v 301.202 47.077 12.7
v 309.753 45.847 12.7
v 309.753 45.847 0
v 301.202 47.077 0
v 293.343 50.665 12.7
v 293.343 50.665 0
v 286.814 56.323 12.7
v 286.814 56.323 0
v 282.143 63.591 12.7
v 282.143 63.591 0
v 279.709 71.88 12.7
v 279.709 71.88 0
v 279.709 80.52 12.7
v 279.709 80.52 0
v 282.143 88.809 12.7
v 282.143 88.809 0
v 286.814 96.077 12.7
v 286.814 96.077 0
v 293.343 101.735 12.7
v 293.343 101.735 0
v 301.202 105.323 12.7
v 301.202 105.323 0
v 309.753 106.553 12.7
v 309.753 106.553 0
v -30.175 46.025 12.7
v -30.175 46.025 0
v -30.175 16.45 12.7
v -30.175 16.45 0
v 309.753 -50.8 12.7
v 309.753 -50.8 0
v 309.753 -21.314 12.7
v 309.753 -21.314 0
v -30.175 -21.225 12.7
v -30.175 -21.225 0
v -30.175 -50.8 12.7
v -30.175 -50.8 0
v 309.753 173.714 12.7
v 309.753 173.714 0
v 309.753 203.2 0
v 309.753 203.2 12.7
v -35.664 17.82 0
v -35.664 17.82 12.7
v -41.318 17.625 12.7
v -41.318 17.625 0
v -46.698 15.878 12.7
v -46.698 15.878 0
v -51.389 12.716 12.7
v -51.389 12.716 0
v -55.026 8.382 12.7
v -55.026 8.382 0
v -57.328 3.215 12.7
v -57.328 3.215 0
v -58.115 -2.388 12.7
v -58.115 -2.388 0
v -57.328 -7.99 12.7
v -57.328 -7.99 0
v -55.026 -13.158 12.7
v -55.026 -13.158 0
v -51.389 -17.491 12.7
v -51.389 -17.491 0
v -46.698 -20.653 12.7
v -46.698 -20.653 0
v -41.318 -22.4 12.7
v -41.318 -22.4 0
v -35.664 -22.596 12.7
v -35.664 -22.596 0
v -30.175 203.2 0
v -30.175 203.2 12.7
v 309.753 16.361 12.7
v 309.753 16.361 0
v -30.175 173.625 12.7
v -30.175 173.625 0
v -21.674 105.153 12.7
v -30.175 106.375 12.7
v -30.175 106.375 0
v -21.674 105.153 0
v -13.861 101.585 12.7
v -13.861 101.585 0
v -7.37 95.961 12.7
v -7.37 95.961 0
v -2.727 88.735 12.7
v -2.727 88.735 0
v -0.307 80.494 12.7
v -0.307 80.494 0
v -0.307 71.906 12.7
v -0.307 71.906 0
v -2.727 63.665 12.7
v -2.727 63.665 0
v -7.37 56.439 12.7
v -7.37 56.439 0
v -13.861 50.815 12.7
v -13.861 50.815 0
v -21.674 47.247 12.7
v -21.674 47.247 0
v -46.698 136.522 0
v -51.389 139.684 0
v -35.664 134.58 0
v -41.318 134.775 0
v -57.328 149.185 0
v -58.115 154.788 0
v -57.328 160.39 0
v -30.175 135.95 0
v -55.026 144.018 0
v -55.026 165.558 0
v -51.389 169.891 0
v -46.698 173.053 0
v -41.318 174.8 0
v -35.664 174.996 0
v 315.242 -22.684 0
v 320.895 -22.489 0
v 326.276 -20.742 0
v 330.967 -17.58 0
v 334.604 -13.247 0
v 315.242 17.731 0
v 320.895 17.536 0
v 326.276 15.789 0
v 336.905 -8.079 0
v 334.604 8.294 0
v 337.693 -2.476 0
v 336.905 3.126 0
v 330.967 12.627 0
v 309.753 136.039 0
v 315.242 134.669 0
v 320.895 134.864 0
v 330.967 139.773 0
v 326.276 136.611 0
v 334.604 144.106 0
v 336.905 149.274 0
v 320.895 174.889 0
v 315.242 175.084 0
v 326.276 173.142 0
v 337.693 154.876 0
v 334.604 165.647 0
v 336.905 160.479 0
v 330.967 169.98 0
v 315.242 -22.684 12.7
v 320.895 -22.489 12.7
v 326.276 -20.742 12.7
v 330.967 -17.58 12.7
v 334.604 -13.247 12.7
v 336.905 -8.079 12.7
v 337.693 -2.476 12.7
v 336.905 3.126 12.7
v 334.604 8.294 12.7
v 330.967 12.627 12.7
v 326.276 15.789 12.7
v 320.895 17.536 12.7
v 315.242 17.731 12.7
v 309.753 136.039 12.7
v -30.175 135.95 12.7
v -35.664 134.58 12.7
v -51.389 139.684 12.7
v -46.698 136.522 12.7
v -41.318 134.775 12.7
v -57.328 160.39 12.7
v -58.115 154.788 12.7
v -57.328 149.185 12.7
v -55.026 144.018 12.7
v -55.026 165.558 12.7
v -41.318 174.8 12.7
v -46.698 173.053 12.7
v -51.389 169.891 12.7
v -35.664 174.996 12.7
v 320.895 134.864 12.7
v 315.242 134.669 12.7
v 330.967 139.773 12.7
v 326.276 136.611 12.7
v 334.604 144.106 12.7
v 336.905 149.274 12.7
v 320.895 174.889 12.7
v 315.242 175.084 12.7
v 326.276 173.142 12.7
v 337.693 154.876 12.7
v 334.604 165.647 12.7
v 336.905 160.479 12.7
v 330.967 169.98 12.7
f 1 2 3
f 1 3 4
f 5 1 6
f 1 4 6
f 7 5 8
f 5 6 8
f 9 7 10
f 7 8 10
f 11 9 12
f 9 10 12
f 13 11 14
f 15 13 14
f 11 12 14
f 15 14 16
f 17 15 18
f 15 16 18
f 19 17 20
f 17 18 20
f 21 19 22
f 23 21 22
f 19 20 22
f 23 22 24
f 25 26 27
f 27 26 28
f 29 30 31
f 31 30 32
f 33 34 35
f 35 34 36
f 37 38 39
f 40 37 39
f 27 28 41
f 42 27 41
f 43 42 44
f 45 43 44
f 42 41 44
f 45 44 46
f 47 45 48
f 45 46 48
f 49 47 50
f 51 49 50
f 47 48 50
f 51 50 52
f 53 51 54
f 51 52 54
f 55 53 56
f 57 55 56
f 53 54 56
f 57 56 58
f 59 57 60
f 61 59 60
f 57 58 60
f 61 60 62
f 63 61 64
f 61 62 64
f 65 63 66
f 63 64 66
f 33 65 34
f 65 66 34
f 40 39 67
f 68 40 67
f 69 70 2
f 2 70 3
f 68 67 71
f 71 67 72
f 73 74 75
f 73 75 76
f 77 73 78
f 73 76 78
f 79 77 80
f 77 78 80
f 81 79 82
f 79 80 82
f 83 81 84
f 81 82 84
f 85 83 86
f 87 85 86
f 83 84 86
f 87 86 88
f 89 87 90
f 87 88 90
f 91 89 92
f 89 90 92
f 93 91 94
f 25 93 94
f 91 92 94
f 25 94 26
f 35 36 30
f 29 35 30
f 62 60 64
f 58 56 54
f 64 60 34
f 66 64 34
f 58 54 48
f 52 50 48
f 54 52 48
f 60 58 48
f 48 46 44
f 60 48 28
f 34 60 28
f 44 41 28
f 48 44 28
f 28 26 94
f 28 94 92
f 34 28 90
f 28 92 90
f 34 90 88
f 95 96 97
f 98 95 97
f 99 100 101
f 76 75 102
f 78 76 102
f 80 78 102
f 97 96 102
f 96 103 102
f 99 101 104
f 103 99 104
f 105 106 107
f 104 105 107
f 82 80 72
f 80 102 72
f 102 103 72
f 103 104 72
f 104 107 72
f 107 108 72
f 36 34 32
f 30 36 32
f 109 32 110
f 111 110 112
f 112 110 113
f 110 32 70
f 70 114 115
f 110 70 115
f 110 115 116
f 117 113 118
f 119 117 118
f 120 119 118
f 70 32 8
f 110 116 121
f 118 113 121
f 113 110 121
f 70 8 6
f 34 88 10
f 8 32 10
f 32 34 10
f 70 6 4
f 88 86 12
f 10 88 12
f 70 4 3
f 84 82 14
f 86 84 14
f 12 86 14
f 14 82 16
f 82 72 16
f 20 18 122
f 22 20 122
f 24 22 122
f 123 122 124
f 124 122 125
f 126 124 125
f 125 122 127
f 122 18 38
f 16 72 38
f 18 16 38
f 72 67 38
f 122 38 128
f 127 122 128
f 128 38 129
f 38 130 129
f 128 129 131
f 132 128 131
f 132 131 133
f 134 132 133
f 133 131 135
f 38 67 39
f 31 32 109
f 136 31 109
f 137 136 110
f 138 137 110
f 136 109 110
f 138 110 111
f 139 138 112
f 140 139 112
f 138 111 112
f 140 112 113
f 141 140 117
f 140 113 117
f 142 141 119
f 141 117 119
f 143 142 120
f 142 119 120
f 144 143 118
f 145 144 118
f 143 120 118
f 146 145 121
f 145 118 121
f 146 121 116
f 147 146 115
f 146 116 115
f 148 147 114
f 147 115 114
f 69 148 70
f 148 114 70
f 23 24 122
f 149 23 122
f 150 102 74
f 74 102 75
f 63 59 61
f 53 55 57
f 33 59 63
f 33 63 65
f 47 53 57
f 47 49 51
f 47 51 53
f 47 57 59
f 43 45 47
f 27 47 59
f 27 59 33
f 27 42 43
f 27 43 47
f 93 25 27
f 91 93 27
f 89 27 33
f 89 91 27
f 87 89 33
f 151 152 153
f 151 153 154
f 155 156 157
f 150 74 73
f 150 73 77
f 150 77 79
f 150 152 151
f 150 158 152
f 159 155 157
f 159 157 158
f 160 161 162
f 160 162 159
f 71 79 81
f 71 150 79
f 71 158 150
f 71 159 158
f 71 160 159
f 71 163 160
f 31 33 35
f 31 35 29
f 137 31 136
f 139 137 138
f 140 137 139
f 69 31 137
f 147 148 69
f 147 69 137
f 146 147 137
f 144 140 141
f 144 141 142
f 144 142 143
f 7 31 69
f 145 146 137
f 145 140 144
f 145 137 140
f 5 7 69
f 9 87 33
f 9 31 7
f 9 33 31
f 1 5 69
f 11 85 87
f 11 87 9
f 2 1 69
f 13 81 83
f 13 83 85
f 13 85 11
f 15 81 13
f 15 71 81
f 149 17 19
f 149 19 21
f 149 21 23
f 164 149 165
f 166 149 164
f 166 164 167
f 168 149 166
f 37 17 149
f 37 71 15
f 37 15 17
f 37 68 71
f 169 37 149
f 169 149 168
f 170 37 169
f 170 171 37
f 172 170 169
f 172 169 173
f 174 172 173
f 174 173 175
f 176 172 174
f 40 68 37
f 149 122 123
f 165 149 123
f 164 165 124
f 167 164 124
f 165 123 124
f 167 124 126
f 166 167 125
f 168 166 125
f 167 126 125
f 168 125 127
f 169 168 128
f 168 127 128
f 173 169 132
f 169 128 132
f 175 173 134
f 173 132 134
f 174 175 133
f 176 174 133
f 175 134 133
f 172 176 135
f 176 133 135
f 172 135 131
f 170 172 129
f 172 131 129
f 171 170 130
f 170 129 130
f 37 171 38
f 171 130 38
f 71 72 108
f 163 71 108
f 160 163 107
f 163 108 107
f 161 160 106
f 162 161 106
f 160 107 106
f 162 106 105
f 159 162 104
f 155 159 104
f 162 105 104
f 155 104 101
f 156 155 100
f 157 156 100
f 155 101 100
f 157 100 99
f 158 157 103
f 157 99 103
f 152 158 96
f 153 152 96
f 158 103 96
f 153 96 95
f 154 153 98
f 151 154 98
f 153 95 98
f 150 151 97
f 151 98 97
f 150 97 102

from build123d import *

# Parameters (mm, degrees)
F1_DEPTH = 12.7


with BuildPart() as f1:
    # F0 (on Top) → F1 (new body)
    with BuildSketch(Plane.XY):
        with BuildLine():
            ThreePointArc((-30.1752, 106.3752), (0, 76.2), (-30.1752, 46.0248))
            Line((-30.1752, 46.0248), (-30.1752, 16.449544))
            ThreePointArc((-30.1752, 16.449544), (-58.1152, -2.3876), (-30.1752, -21.224744))
            Line((-30.1752, -21.224744), (-30.1752, -50.8))
            Line((-30.1752, -50.8), (309.753, -50.8))
            Line((309.753, -50.8), (309.753, -21.313644))
            ThreePointArc((309.753, -21.313644), (337.693, -2.4765), (309.753, 16.360644))
            Line((309.753, 16.360644), (309.753, 45.847))
            ThreePointArc((309.753, 45.847), (279.4, 76.2), (309.753, 106.553))
            Line((309.753, 106.553), (309.753, 136.039356))
            ThreePointArc((309.753, 136.039356), (337.693, 154.8765), (309.753, 173.713644))
            Line((309.753, 173.713644), (309.753, 203.2))
            Line((309.753, 203.2), (-30.1752, 203.2))
            Line((-30.1752, 203.2), (-30.1752, 173.624744))
            ThreePointArc((-30.1752, 173.624744), (-58.1152, 154.7876), (-30.1752, 135.950456))
            Line((-30.1752, 135.950456), (-30.1752, 106.3752))
        make_face()
    extrude(amount=F1_DEPTH)


solid = f1.part
